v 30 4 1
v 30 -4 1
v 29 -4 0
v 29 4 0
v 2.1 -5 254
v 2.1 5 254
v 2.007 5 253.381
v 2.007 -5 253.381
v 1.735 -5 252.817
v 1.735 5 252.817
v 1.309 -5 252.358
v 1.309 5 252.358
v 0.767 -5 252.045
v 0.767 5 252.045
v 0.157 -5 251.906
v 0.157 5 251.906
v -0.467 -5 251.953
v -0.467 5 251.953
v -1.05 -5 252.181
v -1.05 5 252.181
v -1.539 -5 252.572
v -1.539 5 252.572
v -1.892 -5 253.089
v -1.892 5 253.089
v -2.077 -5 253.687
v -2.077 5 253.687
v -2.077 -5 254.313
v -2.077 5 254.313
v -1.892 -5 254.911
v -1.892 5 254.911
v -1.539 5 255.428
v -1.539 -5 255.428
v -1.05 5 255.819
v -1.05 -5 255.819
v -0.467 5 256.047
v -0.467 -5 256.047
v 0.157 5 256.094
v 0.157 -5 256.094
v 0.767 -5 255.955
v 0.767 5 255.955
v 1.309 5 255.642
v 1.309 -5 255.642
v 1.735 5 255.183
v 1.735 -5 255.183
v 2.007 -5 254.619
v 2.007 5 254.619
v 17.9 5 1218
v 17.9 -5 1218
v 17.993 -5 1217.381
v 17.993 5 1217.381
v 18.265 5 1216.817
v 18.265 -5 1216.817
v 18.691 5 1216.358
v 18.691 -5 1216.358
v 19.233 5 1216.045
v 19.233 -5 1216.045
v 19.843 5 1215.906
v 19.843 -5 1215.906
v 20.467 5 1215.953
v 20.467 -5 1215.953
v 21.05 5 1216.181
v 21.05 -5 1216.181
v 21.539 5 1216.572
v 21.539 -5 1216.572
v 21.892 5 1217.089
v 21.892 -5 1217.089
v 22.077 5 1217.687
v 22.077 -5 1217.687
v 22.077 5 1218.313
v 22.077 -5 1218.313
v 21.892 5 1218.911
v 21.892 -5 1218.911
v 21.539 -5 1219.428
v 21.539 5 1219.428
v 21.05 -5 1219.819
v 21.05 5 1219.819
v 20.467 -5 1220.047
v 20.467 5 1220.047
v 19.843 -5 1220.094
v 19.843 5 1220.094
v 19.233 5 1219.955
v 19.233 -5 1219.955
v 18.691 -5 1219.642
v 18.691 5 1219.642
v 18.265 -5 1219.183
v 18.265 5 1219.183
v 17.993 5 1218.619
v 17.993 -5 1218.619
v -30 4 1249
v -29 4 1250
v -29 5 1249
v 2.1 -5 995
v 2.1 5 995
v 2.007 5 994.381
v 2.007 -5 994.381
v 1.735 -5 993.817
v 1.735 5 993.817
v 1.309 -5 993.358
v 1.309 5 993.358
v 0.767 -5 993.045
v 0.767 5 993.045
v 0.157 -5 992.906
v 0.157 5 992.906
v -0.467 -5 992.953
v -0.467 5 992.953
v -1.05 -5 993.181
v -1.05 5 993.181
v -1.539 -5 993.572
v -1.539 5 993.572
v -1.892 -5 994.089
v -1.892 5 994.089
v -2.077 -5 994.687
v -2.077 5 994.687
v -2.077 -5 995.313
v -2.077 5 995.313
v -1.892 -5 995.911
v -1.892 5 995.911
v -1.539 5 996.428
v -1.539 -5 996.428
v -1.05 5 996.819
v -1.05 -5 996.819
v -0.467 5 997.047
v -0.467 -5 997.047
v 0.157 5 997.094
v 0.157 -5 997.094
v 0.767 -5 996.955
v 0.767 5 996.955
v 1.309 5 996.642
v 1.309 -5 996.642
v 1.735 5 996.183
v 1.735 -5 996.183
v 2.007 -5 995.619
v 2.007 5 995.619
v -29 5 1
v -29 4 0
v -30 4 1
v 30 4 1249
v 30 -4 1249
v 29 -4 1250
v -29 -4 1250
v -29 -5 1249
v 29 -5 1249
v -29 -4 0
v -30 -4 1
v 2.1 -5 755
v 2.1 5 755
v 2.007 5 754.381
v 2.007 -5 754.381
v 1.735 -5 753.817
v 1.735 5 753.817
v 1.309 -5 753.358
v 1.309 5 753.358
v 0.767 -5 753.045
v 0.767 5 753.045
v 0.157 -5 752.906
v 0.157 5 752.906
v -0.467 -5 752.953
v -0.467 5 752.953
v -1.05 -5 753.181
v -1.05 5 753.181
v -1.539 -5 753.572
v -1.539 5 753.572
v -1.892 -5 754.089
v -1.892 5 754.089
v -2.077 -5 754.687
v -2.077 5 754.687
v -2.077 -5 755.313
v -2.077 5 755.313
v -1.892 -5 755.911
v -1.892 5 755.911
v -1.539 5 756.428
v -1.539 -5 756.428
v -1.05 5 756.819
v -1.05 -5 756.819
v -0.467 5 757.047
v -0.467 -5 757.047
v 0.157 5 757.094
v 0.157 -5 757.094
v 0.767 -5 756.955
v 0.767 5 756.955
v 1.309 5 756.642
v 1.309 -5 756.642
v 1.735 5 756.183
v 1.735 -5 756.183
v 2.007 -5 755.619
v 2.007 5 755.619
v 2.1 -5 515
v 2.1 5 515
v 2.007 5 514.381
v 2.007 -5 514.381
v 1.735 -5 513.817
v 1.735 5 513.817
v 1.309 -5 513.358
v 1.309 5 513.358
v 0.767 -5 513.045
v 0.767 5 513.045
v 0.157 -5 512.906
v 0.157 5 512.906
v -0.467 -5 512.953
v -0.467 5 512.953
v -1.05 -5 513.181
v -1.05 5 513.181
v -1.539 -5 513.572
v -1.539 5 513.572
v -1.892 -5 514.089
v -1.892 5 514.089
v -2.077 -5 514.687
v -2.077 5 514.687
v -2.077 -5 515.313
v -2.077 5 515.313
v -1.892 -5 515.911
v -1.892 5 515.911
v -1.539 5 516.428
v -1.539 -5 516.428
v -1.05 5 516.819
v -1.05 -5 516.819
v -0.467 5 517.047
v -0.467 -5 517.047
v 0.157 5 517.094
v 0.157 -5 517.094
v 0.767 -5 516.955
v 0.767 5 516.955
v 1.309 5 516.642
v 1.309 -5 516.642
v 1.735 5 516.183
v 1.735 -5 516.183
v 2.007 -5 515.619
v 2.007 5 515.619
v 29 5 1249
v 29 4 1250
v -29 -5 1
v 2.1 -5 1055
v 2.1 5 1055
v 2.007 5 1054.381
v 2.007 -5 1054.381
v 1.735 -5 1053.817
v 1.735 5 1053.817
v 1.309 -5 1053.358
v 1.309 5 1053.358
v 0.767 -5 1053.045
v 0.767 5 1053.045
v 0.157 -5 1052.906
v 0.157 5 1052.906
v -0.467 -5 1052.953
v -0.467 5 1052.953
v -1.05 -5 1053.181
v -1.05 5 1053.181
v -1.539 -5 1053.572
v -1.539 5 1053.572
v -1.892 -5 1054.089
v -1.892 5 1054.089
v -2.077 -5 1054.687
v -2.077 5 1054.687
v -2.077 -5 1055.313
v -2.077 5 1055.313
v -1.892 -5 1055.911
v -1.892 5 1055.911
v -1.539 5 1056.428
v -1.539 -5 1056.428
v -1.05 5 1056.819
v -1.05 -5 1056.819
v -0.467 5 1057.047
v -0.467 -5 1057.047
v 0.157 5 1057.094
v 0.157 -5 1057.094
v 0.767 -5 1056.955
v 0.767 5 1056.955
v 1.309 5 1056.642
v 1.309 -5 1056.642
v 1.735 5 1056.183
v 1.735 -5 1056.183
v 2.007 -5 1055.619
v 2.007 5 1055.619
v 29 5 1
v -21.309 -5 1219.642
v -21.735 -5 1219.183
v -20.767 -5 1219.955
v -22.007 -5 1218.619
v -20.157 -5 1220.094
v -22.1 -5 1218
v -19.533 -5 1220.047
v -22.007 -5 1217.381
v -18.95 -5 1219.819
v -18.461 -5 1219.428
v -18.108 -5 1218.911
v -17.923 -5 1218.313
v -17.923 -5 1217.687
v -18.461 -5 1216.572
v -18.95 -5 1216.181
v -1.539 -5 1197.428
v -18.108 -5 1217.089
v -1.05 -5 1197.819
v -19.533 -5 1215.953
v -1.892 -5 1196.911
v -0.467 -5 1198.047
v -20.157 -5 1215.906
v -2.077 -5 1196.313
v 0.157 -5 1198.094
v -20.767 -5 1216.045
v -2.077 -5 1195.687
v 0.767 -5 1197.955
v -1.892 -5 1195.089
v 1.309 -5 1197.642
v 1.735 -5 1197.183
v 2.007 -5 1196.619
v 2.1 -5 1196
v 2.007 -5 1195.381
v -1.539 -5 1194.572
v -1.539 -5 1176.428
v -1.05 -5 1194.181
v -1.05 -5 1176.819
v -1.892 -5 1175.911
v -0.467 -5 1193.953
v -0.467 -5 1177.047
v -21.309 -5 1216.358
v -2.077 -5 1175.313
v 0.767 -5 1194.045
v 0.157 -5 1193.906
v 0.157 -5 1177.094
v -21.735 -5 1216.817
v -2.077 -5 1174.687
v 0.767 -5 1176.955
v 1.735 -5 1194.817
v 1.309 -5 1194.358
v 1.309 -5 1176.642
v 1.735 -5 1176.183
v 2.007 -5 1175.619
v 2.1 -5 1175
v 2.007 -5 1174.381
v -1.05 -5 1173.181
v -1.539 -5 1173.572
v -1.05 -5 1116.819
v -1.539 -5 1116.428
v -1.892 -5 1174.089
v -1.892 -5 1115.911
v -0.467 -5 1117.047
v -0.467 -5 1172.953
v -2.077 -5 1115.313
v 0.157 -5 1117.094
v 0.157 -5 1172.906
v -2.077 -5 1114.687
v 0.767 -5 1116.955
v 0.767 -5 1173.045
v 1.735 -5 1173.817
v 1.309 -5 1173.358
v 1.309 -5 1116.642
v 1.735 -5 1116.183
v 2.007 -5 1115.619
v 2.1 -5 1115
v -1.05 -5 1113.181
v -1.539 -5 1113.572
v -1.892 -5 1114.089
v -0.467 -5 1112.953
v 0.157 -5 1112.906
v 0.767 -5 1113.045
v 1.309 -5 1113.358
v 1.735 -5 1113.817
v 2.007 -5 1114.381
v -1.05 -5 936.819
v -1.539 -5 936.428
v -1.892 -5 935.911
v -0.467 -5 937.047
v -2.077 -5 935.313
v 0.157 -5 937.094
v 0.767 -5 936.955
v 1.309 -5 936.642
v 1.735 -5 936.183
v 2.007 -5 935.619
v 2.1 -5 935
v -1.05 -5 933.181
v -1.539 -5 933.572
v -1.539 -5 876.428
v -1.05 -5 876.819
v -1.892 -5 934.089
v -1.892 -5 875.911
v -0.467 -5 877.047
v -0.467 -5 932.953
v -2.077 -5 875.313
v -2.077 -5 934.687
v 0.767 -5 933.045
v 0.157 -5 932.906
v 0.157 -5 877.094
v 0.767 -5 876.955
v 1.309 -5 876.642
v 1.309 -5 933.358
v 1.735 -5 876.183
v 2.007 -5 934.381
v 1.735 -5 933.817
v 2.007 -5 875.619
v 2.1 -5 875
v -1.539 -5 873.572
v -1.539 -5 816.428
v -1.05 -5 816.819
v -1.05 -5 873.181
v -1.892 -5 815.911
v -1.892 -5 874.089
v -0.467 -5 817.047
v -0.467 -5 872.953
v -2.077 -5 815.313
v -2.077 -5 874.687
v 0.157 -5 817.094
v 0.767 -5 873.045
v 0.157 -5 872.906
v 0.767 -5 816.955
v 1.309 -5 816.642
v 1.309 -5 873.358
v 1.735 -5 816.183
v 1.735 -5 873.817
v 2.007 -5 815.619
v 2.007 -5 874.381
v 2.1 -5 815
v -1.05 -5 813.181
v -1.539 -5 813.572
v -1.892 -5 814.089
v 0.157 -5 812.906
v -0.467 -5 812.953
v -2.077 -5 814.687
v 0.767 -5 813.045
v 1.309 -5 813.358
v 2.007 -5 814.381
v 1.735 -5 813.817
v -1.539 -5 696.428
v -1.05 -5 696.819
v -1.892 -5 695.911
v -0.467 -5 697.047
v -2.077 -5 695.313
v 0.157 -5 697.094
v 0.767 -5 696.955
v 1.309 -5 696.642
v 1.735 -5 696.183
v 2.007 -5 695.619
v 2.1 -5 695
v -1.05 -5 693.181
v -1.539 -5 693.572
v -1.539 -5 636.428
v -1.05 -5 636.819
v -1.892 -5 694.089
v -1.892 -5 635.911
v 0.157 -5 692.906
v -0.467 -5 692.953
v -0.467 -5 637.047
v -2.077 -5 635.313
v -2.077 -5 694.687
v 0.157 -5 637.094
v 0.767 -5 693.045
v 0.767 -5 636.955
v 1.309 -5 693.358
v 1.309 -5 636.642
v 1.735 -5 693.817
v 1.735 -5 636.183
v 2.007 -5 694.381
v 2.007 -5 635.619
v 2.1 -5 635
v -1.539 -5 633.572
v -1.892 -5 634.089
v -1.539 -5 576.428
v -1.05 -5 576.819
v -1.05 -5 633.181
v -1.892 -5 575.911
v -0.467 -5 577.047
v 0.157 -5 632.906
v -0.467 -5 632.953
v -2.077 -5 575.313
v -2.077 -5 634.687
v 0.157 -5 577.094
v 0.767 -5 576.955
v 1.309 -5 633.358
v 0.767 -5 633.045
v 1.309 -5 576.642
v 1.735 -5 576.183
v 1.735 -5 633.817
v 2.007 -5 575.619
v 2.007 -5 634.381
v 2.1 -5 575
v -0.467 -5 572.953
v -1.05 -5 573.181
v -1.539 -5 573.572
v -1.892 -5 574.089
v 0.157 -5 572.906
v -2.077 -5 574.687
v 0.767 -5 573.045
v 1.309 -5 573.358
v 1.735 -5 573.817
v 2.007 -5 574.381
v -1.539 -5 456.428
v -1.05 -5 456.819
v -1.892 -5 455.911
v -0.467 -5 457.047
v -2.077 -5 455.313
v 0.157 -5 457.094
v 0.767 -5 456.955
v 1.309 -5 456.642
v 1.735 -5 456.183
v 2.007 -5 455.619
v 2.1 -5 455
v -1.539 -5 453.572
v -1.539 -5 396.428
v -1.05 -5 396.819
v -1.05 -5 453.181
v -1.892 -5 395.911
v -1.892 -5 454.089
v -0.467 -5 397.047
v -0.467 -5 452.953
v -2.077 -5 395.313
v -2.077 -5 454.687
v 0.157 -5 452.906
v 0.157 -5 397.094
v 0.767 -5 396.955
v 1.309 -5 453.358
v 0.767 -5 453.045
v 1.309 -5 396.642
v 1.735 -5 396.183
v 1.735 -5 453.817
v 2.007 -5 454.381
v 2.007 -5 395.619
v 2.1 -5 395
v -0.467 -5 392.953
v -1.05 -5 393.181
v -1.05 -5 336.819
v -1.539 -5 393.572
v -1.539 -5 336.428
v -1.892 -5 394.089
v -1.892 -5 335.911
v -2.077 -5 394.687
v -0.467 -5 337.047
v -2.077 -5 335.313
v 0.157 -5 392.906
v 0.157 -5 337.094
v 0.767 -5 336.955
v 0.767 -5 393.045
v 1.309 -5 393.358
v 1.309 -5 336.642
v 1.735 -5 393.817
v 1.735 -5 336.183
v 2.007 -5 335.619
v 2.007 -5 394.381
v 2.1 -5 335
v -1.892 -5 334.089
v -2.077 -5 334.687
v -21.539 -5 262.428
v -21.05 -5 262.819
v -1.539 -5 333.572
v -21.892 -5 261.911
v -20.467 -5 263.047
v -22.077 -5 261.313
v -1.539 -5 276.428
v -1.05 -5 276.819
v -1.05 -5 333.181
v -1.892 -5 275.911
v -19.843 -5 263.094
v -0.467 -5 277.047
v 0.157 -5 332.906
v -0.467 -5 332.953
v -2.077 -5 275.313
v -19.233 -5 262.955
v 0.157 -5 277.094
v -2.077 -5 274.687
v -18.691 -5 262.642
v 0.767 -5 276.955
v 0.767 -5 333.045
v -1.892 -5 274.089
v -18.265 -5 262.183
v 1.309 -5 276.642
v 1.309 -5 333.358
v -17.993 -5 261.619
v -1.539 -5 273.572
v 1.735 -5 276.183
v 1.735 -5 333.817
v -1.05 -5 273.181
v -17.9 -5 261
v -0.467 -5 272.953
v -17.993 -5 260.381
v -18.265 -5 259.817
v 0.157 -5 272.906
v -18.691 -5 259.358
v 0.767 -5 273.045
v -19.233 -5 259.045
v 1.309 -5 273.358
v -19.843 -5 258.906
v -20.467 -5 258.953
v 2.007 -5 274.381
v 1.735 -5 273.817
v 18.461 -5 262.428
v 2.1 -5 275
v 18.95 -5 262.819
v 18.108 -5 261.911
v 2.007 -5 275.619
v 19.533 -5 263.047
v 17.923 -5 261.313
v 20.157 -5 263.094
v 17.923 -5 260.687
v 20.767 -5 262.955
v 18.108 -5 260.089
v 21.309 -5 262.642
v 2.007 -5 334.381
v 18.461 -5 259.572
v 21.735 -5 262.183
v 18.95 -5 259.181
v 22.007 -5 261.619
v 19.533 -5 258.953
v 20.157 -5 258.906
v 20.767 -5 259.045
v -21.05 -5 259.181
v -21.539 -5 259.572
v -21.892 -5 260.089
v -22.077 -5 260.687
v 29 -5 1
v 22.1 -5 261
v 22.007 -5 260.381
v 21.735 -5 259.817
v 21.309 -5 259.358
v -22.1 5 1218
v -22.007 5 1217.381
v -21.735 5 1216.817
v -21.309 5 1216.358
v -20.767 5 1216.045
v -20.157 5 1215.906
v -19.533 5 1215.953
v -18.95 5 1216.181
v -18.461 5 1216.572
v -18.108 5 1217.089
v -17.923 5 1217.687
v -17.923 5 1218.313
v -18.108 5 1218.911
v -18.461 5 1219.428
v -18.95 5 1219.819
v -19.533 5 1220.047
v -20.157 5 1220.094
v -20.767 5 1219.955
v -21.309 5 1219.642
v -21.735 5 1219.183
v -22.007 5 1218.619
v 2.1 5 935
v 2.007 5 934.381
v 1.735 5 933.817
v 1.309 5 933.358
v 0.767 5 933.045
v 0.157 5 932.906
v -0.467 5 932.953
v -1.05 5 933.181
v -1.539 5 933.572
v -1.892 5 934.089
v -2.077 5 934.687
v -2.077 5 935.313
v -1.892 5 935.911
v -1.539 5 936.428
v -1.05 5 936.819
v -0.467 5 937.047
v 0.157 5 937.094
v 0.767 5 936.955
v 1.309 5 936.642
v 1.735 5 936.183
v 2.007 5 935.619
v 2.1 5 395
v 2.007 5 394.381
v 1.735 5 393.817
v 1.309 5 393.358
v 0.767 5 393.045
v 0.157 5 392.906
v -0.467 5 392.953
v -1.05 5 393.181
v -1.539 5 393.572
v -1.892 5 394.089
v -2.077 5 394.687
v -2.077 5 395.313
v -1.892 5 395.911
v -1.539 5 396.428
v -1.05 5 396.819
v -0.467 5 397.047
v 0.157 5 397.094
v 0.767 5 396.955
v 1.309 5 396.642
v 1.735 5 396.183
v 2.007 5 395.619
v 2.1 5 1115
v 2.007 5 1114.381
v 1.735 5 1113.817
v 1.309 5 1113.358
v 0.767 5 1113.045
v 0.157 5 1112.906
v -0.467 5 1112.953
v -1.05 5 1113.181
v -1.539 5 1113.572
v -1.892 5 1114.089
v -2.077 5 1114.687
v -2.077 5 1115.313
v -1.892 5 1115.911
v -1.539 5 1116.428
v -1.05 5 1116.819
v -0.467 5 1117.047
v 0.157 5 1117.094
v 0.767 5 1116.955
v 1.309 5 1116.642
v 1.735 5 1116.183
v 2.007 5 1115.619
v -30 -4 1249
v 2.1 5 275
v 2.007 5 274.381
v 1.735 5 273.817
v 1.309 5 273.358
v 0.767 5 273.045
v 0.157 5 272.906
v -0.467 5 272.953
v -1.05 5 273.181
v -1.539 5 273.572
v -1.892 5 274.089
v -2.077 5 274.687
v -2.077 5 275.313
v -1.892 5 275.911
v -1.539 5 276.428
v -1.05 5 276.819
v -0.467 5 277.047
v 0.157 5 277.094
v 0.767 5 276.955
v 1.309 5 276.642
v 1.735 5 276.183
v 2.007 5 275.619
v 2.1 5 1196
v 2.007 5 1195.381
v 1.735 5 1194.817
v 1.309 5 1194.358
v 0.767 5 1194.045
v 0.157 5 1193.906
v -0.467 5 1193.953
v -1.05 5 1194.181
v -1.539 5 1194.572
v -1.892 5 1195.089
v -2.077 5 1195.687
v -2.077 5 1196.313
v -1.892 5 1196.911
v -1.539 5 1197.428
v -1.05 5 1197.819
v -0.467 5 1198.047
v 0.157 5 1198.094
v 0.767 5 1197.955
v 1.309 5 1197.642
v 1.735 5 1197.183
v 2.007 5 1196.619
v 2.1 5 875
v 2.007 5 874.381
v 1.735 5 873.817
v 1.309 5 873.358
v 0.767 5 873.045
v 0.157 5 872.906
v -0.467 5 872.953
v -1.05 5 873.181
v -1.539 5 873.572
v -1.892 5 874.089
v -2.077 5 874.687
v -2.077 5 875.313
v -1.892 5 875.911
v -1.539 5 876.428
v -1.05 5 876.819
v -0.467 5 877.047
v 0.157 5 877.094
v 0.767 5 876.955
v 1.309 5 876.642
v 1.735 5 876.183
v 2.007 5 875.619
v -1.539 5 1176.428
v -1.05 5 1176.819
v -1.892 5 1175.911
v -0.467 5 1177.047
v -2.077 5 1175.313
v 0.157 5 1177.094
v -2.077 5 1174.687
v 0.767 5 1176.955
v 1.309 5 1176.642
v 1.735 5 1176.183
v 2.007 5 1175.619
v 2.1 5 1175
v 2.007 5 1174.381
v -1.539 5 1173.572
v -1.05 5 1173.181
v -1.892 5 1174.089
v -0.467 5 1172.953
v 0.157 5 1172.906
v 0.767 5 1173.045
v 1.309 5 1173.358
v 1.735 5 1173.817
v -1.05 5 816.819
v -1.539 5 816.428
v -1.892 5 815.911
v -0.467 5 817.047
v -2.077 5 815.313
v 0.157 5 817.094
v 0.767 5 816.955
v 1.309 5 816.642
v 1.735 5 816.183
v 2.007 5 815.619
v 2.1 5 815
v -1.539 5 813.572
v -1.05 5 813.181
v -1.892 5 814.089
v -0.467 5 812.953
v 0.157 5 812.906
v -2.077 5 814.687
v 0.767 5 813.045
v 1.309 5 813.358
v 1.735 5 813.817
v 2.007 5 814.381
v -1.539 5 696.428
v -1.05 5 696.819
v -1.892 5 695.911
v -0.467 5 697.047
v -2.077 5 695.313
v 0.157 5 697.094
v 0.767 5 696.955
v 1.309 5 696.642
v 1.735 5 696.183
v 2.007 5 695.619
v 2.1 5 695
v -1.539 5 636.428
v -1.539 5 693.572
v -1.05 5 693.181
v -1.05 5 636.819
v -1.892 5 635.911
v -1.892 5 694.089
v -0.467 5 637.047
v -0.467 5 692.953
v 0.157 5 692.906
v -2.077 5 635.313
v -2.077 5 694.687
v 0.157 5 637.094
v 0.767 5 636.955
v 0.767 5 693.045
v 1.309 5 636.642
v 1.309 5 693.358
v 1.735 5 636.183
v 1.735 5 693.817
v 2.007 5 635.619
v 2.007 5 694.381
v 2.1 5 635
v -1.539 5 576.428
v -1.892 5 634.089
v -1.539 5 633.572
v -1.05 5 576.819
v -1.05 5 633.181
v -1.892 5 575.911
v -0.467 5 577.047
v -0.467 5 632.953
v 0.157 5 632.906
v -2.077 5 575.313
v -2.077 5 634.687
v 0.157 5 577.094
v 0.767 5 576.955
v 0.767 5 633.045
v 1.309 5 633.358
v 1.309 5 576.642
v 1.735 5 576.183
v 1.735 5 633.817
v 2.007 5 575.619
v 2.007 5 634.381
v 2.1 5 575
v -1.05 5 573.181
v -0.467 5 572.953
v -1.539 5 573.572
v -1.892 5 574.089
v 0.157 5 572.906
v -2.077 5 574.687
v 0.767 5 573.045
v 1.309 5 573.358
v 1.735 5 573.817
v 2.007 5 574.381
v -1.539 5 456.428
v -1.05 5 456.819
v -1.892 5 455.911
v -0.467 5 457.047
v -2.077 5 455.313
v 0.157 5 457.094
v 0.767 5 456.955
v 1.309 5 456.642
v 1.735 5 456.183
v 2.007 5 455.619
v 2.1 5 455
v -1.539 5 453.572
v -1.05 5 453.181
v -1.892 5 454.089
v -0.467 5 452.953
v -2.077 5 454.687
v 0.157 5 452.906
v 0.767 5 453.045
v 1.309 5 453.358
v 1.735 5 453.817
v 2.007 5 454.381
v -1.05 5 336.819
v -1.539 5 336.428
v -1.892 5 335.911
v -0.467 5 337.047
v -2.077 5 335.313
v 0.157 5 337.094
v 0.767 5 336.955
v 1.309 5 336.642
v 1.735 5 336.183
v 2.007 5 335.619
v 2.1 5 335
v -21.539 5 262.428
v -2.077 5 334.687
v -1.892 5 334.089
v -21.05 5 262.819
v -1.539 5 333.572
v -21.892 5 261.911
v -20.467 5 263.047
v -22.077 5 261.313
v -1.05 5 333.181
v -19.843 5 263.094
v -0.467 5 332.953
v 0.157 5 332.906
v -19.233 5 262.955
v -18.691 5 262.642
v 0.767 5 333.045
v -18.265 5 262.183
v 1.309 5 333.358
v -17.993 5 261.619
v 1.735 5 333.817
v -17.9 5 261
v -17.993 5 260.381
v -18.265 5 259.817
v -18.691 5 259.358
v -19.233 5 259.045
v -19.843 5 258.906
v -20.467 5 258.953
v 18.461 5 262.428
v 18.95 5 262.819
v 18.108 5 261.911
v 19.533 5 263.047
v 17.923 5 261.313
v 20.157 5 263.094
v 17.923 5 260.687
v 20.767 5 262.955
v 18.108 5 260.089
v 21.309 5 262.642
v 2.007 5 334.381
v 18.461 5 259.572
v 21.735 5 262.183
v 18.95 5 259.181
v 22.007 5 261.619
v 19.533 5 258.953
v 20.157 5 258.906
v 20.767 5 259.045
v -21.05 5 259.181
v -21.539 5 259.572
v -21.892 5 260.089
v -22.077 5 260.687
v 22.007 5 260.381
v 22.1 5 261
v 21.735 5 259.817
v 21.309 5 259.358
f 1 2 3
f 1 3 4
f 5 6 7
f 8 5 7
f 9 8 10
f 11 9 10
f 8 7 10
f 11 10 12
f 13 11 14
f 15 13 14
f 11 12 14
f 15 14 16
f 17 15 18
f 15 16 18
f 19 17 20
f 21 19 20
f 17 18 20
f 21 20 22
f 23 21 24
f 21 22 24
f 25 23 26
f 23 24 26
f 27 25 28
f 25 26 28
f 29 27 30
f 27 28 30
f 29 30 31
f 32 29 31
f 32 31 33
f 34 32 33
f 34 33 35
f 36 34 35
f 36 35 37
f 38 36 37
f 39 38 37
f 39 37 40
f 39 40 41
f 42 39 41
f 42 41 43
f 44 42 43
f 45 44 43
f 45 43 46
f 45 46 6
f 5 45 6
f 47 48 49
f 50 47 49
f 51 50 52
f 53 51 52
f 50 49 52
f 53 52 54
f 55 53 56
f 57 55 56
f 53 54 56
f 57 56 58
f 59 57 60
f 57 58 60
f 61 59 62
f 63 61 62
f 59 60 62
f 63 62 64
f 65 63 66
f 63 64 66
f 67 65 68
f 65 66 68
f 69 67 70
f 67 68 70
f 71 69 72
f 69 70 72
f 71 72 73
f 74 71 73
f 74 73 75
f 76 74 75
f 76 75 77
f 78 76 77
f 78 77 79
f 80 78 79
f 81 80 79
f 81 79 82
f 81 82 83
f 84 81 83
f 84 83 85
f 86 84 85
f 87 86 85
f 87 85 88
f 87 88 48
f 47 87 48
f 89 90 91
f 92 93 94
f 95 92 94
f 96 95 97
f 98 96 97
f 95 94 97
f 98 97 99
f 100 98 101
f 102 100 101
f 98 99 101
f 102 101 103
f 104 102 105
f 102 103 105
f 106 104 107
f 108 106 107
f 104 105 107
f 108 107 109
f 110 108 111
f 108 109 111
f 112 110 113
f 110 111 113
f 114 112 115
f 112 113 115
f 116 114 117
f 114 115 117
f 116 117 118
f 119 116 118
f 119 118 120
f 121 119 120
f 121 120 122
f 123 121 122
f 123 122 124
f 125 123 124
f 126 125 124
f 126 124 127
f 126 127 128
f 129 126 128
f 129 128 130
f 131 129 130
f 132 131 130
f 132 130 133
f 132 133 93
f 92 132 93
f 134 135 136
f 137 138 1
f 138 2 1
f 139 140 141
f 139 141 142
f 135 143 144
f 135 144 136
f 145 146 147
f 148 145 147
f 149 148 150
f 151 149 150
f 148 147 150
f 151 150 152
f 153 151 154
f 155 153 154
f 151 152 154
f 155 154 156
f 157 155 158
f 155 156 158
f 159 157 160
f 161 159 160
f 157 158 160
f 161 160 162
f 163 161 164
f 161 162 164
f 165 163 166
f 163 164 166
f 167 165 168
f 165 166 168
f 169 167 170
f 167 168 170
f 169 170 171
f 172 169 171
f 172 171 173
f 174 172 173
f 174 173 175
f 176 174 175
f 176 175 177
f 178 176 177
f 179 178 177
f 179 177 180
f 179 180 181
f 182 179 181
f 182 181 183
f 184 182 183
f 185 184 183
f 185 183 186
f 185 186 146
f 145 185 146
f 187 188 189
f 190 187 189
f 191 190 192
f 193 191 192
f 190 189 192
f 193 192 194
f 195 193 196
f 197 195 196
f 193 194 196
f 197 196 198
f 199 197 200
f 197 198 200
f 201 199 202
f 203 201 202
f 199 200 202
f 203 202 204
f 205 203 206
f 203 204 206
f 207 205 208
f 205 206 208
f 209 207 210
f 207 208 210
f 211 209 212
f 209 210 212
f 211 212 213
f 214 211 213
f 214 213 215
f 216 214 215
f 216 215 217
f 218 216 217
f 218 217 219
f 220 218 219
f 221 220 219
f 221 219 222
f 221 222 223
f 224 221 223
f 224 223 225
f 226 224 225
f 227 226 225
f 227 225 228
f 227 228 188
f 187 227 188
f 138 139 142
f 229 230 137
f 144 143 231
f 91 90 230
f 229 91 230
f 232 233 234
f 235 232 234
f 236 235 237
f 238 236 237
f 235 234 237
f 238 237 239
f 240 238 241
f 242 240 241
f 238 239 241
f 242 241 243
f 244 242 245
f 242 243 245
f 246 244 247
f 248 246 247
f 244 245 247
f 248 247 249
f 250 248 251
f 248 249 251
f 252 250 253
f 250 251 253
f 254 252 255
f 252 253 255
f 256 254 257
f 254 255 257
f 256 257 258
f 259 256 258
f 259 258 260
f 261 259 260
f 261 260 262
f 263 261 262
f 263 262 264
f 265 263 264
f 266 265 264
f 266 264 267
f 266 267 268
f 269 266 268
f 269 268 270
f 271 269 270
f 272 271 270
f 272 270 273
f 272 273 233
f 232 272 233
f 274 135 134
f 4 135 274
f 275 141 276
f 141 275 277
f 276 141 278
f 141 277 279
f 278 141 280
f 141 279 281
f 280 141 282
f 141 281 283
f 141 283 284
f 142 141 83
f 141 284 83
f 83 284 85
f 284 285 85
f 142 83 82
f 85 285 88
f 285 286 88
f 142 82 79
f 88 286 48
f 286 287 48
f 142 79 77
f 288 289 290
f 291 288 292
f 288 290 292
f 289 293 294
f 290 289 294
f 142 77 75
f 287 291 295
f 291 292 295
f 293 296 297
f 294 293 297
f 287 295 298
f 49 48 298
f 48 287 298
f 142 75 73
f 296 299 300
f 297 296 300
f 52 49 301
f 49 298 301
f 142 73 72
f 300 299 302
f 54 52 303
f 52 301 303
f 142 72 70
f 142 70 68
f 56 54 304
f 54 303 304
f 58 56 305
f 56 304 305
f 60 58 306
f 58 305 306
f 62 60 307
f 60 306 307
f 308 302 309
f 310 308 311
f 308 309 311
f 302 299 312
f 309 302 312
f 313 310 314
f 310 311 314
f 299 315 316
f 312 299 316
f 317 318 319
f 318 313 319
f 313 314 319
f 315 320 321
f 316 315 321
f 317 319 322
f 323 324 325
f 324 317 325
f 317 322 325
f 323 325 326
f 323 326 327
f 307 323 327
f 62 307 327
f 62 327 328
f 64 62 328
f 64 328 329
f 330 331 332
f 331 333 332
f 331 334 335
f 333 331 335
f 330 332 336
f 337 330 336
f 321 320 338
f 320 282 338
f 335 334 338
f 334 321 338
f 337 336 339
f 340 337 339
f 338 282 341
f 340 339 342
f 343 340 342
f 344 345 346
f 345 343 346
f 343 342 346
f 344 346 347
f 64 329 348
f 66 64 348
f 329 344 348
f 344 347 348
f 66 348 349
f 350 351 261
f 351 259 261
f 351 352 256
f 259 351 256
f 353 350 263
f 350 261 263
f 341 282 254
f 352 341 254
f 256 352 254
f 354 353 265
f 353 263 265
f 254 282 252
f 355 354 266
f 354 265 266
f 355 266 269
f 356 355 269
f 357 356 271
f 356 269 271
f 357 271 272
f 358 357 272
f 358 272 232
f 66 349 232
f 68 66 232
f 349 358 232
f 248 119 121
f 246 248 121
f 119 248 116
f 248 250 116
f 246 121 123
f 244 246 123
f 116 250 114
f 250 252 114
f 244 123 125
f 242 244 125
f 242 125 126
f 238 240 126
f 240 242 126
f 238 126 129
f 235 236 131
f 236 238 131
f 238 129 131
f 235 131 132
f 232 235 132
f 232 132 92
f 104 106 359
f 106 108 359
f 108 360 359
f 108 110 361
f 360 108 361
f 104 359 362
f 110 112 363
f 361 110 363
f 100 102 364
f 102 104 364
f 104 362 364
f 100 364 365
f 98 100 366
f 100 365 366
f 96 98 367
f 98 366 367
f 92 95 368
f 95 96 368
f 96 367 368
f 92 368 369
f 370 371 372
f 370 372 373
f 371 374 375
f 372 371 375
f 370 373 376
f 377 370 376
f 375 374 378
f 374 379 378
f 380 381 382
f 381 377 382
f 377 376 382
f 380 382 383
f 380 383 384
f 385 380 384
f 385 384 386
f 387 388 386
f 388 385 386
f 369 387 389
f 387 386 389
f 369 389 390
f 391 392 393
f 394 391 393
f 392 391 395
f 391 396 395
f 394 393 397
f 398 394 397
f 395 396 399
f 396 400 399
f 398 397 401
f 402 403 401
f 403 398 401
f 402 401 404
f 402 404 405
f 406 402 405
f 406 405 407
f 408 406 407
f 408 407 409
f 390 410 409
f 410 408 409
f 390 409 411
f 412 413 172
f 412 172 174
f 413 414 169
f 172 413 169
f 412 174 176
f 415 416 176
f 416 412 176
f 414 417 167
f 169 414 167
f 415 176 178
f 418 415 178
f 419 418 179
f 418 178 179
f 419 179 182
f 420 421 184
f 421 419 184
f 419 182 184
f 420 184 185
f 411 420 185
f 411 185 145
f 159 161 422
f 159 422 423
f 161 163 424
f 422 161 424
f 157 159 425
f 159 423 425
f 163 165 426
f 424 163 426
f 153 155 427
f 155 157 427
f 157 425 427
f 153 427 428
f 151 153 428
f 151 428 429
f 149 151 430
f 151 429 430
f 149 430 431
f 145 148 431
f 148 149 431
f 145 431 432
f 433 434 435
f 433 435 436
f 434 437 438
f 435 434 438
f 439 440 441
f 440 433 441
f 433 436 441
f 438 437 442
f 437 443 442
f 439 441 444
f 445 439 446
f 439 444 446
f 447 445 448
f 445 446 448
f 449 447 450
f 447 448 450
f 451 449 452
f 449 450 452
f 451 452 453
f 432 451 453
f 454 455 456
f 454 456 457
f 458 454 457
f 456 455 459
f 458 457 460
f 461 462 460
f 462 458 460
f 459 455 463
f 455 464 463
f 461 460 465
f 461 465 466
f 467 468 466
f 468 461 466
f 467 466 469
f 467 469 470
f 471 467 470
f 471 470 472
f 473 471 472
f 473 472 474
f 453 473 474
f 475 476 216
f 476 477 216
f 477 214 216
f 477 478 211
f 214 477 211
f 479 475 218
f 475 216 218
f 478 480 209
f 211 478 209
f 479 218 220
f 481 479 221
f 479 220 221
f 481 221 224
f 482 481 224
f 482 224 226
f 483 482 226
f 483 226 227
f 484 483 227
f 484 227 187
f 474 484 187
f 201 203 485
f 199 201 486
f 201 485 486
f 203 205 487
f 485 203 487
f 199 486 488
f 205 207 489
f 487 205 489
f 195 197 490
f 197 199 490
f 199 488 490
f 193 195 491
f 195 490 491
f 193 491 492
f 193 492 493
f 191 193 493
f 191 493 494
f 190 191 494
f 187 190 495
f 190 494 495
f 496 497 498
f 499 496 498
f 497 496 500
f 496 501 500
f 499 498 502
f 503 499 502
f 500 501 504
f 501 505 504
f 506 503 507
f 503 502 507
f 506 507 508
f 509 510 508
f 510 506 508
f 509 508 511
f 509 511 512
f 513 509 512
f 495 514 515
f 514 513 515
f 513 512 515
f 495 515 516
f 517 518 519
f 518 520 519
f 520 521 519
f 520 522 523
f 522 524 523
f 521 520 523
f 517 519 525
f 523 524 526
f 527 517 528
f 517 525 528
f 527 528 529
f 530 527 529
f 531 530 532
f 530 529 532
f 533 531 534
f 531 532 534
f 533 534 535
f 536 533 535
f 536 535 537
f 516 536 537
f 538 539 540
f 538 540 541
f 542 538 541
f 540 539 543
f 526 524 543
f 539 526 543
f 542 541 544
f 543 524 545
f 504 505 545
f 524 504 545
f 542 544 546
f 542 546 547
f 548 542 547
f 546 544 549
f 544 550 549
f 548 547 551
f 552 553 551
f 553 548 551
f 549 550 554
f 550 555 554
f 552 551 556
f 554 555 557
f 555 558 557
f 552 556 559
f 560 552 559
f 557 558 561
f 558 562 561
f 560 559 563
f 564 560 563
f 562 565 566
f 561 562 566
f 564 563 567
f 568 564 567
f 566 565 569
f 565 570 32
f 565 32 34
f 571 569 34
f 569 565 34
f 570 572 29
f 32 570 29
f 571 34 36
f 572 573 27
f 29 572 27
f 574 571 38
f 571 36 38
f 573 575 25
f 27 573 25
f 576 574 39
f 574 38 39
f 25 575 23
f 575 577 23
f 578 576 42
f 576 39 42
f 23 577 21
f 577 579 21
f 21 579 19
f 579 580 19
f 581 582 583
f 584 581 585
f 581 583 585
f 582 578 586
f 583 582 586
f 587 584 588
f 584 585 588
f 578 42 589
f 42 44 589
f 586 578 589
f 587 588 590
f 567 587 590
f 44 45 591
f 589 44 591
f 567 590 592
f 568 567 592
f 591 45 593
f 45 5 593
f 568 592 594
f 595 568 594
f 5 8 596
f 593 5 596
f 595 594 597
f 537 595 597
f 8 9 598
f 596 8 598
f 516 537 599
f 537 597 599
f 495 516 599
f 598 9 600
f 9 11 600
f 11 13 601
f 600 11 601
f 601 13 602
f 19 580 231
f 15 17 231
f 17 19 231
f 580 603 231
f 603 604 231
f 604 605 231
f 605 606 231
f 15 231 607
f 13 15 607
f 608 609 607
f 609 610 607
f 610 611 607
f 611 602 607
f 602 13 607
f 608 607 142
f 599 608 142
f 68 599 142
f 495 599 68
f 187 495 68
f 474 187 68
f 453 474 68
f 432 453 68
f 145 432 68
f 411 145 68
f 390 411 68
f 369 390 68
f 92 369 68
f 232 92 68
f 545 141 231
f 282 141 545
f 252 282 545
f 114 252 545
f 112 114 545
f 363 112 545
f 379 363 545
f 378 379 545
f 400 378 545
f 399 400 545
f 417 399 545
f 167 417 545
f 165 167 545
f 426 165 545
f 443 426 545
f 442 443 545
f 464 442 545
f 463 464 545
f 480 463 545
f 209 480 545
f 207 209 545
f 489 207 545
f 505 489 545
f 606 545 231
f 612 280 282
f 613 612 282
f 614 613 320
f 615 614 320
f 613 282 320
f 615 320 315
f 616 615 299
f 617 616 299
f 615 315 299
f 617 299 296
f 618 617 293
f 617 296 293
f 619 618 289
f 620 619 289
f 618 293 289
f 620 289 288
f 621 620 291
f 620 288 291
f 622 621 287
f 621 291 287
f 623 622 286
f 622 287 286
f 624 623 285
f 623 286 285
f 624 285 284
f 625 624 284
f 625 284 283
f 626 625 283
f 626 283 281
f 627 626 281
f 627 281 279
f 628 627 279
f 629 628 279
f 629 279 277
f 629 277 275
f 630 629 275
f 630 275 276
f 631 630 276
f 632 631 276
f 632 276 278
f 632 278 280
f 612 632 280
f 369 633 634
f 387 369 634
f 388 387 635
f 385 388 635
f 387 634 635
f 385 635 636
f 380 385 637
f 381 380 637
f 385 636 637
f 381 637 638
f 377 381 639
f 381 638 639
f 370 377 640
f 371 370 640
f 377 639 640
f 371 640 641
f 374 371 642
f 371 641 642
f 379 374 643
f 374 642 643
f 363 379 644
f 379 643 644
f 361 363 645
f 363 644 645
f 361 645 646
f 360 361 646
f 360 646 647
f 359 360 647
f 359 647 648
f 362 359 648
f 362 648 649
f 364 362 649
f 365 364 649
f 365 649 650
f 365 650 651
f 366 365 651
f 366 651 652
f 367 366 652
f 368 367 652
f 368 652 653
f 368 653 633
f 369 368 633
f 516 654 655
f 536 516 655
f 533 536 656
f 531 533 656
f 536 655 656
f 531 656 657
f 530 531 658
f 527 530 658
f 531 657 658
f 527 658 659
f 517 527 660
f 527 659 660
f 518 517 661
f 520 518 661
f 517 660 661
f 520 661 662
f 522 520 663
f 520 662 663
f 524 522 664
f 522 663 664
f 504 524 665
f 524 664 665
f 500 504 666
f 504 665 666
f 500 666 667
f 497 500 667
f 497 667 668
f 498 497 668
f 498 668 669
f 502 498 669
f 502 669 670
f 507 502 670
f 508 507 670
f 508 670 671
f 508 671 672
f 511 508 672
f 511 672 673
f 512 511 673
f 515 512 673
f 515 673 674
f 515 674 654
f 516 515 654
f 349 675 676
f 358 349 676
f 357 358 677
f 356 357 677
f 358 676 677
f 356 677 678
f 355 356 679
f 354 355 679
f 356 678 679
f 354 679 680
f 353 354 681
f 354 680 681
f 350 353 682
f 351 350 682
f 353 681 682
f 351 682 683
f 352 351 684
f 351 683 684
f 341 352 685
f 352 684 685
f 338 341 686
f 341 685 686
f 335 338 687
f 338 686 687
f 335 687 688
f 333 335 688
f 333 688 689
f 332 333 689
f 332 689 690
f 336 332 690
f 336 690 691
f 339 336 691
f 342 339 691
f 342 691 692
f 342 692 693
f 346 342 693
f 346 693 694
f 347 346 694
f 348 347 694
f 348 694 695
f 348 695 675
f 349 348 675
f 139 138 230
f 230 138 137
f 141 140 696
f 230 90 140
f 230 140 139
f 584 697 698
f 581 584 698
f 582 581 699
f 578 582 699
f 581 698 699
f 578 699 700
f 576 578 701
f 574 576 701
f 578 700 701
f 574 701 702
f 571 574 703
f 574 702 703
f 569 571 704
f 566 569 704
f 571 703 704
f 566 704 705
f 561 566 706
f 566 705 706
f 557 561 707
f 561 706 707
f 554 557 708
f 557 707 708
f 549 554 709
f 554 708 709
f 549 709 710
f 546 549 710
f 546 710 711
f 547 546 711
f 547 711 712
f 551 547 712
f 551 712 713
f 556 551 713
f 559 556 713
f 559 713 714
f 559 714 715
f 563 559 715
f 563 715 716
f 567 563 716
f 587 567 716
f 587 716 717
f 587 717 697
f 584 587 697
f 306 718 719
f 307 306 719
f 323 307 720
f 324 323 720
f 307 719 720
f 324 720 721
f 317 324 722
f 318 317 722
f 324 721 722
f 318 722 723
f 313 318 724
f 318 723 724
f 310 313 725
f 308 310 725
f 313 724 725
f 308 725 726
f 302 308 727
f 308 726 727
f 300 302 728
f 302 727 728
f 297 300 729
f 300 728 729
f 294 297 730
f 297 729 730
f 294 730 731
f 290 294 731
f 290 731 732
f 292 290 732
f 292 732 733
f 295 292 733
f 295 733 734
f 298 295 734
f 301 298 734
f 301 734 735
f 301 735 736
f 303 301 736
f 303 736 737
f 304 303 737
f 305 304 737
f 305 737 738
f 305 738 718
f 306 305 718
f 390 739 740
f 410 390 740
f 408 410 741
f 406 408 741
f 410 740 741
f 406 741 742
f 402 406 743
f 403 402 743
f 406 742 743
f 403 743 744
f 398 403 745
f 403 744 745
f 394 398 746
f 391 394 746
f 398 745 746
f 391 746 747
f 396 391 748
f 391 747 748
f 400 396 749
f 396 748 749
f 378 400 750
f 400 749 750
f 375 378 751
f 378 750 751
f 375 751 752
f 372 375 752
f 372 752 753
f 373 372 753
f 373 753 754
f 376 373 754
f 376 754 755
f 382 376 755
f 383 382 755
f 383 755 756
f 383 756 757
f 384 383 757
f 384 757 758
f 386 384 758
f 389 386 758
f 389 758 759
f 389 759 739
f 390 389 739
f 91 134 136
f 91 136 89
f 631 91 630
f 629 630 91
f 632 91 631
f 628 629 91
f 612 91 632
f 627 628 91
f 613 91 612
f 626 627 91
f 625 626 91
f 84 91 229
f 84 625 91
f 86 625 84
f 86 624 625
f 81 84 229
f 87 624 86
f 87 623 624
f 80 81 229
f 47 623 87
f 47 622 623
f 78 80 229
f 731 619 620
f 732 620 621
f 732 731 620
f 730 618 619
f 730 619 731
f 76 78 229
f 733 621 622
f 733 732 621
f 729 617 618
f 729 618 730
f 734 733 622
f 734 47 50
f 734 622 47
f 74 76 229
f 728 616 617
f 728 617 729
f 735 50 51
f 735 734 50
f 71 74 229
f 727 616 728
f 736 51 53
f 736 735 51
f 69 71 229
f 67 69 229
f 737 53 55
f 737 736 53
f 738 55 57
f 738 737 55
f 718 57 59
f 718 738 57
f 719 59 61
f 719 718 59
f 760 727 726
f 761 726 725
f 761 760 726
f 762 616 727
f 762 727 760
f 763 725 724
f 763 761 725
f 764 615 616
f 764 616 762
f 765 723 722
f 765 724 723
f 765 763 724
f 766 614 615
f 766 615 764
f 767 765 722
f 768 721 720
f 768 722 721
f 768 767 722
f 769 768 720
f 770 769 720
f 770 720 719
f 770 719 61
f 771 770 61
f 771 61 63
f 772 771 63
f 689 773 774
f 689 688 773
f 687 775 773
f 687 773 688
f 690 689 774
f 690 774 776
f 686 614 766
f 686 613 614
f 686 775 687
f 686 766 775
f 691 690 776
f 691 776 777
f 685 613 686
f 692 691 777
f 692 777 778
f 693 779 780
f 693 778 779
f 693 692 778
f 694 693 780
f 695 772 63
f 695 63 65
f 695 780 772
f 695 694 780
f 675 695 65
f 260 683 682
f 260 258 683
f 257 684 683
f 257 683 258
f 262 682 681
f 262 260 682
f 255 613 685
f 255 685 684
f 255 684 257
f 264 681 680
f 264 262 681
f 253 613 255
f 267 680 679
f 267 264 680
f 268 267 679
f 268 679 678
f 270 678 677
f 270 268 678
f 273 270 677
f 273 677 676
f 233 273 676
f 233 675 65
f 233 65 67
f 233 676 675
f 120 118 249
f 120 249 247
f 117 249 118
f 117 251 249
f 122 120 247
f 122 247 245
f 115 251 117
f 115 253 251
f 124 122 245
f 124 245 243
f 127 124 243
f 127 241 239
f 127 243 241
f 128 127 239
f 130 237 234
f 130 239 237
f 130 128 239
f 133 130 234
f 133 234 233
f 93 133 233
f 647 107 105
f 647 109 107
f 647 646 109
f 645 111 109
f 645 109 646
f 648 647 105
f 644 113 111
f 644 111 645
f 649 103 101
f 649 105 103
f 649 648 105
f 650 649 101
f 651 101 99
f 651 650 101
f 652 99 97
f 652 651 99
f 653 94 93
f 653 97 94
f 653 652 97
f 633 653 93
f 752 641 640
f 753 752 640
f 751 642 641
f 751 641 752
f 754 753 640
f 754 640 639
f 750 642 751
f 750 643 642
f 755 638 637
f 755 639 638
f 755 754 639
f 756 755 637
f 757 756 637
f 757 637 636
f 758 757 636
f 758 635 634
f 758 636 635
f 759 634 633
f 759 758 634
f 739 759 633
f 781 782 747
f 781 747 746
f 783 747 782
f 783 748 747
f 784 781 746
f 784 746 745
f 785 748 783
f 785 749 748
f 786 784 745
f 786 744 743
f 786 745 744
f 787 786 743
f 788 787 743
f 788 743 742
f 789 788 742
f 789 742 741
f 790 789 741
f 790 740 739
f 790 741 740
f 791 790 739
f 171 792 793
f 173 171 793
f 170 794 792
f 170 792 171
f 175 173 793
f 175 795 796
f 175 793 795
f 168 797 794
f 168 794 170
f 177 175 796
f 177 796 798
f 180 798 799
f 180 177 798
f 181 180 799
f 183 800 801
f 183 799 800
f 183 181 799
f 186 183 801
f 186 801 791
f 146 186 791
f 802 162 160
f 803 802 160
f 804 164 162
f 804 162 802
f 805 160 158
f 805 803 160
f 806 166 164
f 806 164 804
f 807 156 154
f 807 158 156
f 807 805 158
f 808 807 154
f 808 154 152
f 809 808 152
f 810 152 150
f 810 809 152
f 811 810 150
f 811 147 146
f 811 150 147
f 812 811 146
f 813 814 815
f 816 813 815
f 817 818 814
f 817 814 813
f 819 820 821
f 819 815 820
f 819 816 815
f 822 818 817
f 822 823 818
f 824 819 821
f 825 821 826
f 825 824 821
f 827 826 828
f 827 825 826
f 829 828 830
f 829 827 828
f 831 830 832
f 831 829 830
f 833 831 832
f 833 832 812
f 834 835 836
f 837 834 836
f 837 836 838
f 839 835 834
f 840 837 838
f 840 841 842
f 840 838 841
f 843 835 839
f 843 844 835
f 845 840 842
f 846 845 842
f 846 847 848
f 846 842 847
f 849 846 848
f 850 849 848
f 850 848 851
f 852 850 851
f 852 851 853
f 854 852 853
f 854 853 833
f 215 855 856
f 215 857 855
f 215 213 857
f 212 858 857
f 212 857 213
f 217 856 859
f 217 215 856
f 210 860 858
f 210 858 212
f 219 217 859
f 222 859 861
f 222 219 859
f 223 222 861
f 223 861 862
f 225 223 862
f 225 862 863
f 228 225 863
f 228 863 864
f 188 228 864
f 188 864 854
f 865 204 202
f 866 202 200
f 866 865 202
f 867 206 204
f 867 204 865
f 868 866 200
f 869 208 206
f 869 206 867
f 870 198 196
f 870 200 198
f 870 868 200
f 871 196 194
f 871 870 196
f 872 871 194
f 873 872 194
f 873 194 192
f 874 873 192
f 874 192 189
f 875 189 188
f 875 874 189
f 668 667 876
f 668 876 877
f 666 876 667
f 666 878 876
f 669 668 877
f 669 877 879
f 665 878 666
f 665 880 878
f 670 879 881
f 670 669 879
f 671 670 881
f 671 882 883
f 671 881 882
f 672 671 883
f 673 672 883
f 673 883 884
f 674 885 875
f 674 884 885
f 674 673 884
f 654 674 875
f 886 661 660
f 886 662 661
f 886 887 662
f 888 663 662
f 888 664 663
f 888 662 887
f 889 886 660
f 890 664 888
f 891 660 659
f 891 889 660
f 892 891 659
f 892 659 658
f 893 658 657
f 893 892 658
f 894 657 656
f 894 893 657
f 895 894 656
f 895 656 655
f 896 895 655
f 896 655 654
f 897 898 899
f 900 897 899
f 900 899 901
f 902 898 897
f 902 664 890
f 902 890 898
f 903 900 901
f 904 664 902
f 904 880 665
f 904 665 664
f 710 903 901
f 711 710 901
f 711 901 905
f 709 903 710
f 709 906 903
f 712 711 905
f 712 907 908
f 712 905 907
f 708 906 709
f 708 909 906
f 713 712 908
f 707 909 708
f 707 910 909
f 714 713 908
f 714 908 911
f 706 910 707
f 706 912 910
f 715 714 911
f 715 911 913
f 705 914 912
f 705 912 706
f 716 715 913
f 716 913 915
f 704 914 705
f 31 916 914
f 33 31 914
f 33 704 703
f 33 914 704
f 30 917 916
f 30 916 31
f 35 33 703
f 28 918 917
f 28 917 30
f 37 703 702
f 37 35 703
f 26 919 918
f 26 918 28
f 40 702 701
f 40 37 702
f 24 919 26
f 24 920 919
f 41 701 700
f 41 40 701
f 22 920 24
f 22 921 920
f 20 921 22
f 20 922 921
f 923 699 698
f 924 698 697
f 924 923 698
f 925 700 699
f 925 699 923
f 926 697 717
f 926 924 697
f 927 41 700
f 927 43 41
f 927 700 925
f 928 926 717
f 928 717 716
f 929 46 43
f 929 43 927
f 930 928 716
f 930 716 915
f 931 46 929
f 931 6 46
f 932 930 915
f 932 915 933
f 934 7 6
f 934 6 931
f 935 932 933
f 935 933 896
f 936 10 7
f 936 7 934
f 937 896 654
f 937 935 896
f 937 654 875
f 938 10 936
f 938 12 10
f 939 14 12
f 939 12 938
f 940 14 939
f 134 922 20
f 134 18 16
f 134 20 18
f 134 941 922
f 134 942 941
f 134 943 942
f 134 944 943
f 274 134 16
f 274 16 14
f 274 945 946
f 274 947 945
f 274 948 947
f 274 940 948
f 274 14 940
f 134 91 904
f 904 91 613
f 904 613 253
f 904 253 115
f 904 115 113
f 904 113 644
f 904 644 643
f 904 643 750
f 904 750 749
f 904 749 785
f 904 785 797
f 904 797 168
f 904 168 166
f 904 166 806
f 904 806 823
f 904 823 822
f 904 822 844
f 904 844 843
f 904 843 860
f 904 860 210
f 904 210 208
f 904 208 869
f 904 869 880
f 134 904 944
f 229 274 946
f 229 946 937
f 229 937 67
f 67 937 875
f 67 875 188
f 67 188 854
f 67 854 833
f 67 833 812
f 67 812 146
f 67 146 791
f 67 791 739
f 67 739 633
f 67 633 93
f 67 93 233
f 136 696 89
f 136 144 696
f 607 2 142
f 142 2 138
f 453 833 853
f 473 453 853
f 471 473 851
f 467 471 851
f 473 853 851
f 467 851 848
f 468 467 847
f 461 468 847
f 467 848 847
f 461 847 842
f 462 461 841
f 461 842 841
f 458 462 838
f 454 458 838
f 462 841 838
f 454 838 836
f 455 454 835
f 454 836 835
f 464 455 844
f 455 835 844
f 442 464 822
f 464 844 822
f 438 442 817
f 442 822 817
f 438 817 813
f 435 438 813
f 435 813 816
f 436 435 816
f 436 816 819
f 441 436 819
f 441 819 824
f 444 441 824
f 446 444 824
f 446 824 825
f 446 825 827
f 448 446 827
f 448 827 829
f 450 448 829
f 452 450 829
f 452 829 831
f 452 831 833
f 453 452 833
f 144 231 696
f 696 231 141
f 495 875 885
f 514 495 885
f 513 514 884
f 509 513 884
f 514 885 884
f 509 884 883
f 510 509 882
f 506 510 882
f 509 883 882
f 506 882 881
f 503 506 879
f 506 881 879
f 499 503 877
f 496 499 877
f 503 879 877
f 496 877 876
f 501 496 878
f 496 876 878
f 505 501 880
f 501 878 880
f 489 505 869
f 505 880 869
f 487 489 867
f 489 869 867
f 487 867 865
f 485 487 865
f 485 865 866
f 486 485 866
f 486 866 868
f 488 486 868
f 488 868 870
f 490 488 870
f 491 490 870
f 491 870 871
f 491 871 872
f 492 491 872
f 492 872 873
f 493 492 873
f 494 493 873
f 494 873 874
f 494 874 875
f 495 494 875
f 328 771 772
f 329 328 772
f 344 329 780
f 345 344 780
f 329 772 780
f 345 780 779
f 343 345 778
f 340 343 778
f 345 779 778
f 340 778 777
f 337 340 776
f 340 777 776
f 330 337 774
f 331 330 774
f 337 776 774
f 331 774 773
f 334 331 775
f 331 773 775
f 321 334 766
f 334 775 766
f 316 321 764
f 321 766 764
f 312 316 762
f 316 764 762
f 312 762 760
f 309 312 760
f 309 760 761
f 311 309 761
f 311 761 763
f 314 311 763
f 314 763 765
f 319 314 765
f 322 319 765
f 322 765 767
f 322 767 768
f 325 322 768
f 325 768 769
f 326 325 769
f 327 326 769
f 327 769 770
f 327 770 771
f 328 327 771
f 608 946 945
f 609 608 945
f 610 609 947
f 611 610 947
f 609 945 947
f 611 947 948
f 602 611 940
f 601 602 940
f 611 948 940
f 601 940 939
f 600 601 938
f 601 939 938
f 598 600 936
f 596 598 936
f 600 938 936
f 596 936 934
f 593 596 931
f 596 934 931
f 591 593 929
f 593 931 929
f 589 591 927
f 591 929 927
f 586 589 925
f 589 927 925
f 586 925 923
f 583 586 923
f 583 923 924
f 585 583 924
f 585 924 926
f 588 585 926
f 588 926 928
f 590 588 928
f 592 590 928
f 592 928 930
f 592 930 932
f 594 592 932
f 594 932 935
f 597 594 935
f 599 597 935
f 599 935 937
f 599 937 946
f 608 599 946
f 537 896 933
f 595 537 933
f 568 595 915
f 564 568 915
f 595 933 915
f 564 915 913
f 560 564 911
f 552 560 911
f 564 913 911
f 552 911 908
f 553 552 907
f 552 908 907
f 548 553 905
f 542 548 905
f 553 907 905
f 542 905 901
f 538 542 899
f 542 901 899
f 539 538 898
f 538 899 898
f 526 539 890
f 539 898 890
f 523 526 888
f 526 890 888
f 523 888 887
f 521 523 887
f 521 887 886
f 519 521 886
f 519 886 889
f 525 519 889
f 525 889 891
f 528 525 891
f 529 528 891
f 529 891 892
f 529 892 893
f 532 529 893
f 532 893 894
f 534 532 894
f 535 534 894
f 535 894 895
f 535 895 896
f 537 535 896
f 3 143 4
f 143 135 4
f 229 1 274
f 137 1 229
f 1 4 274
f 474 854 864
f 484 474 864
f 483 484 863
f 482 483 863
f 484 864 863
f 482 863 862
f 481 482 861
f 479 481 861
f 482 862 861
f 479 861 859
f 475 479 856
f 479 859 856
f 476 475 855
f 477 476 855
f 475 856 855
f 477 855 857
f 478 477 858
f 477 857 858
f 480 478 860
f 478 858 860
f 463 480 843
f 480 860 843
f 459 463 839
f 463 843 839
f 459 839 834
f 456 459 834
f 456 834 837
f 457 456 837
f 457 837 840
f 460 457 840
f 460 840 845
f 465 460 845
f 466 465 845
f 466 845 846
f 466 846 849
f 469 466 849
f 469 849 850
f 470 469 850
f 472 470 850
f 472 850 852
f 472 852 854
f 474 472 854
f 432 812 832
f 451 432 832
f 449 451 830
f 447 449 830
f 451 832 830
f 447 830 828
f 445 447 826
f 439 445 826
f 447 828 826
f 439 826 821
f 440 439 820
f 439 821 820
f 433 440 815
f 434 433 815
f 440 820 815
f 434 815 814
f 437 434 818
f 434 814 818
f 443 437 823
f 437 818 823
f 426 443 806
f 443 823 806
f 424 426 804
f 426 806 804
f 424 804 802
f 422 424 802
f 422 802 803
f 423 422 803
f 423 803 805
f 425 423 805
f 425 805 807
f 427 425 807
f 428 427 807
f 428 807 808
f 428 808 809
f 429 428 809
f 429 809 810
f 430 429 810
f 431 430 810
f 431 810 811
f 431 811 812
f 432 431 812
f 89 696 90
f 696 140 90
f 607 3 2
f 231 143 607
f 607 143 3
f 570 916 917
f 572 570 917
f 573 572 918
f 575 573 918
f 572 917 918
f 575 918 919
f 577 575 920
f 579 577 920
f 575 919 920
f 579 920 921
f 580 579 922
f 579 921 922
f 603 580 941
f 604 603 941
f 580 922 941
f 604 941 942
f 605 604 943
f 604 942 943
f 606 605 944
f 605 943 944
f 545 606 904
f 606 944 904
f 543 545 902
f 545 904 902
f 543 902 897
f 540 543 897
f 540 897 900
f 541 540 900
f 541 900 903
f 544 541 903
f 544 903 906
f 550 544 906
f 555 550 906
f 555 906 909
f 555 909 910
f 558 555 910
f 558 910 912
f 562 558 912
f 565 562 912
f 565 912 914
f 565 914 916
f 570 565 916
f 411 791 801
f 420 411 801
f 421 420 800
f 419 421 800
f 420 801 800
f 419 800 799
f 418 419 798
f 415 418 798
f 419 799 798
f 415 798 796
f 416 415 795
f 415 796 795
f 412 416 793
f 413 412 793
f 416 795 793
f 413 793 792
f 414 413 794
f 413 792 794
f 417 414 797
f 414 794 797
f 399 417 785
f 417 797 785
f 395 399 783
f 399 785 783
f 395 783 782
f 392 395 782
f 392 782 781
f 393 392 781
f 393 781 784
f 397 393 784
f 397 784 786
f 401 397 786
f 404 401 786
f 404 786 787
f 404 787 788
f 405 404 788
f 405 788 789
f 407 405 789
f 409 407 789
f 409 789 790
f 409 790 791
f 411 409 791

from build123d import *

# Parameters (mm, degrees)
SKETCH_1_W         = 60
SKETCH_1_H         = 10
EXTRUDE_2_DEPTH    = 1250
HOLE_WIZARD_M5_2_D = 4.2
HOLE_WIZARD_M5_1_D = 4.2
CHAMFER_1_SIZE     = 1
HOLE_WIZARD_M5_3_D = 4.2
HOLE_WIZARD_M5_4_D = 4.2


with BuildPart() as part:
    # 草图1 → 凸台-拉伸2 (new body)
    with BuildSketch(Plane.XY):
        Rectangle(SKETCH_1_W, SKETCH_1_H)
    extrude(amount=EXTRUDE_2_DEPTH)

    # M5 螺纹孔2 (through all)
    with Locations(Plane(origin=(0, -5, 0), x_dir=(-1, 0, 0), z_dir=(0, -1, 0))):
        with Locations((0, -275), (0, -335), (0, -395), (0, -455), (0, -515), (0, -575), (0, -635), (0, -695), (0, -755), (0, -815), (0, -875), (0, -935), (0, -995), (0, -1055), (0, -1115), (0, -1175)):
            Hole(HOLE_WIZARD_M5_2_D / 2)

    # M5 螺纹孔1 (through all)
    with Locations(Plane(origin=(0, -5, 0), x_dir=(-1, 0, 0), z_dir=(0, -1, 0))):
        with Locations((0, -254), (0, -1196)):
            Hole(HOLE_WIZARD_M5_1_D / 2)

    # 倒角1
    chamfer_1_edges = [part.edges().sort_by_distance(p)[0] for p in [
        (-30, 0, 1250),
        (0, -5, 1250),
        (30, 0, 1250),
        (0, -5, 0),
        (-30, 0, 0),
        (0, 5, 0),
        (30, 0, 0),
        (0, 5, 1250),
        (30, -5, 625),
        (-30, -5, 625),
        (-30, 5, 625),
        (30, 5, 625),
    ]]
    chamfer(chamfer_1_edges, length=CHAMFER_1_SIZE)

    # M5 螺纹孔3 (through all)
    with Locations(Plane(origin=(0, -5, 0), x_dir=(-1, 0, 0), z_dir=(0, -1, 0))):
        with Locations((-20, -261), (20, -261)):
            Hole(HOLE_WIZARD_M5_3_D / 2)

    # M5 螺纹孔4 (through all)
    with Locations(Plane(origin=(0, 5, 0), x_dir=(1, 0, 0), z_dir=(0, 1, 0))):
        with Locations((20, -1218), (-20, -1218)):
            Hole(HOLE_WIZARD_M5_4_D / 2)


solid = part.part
